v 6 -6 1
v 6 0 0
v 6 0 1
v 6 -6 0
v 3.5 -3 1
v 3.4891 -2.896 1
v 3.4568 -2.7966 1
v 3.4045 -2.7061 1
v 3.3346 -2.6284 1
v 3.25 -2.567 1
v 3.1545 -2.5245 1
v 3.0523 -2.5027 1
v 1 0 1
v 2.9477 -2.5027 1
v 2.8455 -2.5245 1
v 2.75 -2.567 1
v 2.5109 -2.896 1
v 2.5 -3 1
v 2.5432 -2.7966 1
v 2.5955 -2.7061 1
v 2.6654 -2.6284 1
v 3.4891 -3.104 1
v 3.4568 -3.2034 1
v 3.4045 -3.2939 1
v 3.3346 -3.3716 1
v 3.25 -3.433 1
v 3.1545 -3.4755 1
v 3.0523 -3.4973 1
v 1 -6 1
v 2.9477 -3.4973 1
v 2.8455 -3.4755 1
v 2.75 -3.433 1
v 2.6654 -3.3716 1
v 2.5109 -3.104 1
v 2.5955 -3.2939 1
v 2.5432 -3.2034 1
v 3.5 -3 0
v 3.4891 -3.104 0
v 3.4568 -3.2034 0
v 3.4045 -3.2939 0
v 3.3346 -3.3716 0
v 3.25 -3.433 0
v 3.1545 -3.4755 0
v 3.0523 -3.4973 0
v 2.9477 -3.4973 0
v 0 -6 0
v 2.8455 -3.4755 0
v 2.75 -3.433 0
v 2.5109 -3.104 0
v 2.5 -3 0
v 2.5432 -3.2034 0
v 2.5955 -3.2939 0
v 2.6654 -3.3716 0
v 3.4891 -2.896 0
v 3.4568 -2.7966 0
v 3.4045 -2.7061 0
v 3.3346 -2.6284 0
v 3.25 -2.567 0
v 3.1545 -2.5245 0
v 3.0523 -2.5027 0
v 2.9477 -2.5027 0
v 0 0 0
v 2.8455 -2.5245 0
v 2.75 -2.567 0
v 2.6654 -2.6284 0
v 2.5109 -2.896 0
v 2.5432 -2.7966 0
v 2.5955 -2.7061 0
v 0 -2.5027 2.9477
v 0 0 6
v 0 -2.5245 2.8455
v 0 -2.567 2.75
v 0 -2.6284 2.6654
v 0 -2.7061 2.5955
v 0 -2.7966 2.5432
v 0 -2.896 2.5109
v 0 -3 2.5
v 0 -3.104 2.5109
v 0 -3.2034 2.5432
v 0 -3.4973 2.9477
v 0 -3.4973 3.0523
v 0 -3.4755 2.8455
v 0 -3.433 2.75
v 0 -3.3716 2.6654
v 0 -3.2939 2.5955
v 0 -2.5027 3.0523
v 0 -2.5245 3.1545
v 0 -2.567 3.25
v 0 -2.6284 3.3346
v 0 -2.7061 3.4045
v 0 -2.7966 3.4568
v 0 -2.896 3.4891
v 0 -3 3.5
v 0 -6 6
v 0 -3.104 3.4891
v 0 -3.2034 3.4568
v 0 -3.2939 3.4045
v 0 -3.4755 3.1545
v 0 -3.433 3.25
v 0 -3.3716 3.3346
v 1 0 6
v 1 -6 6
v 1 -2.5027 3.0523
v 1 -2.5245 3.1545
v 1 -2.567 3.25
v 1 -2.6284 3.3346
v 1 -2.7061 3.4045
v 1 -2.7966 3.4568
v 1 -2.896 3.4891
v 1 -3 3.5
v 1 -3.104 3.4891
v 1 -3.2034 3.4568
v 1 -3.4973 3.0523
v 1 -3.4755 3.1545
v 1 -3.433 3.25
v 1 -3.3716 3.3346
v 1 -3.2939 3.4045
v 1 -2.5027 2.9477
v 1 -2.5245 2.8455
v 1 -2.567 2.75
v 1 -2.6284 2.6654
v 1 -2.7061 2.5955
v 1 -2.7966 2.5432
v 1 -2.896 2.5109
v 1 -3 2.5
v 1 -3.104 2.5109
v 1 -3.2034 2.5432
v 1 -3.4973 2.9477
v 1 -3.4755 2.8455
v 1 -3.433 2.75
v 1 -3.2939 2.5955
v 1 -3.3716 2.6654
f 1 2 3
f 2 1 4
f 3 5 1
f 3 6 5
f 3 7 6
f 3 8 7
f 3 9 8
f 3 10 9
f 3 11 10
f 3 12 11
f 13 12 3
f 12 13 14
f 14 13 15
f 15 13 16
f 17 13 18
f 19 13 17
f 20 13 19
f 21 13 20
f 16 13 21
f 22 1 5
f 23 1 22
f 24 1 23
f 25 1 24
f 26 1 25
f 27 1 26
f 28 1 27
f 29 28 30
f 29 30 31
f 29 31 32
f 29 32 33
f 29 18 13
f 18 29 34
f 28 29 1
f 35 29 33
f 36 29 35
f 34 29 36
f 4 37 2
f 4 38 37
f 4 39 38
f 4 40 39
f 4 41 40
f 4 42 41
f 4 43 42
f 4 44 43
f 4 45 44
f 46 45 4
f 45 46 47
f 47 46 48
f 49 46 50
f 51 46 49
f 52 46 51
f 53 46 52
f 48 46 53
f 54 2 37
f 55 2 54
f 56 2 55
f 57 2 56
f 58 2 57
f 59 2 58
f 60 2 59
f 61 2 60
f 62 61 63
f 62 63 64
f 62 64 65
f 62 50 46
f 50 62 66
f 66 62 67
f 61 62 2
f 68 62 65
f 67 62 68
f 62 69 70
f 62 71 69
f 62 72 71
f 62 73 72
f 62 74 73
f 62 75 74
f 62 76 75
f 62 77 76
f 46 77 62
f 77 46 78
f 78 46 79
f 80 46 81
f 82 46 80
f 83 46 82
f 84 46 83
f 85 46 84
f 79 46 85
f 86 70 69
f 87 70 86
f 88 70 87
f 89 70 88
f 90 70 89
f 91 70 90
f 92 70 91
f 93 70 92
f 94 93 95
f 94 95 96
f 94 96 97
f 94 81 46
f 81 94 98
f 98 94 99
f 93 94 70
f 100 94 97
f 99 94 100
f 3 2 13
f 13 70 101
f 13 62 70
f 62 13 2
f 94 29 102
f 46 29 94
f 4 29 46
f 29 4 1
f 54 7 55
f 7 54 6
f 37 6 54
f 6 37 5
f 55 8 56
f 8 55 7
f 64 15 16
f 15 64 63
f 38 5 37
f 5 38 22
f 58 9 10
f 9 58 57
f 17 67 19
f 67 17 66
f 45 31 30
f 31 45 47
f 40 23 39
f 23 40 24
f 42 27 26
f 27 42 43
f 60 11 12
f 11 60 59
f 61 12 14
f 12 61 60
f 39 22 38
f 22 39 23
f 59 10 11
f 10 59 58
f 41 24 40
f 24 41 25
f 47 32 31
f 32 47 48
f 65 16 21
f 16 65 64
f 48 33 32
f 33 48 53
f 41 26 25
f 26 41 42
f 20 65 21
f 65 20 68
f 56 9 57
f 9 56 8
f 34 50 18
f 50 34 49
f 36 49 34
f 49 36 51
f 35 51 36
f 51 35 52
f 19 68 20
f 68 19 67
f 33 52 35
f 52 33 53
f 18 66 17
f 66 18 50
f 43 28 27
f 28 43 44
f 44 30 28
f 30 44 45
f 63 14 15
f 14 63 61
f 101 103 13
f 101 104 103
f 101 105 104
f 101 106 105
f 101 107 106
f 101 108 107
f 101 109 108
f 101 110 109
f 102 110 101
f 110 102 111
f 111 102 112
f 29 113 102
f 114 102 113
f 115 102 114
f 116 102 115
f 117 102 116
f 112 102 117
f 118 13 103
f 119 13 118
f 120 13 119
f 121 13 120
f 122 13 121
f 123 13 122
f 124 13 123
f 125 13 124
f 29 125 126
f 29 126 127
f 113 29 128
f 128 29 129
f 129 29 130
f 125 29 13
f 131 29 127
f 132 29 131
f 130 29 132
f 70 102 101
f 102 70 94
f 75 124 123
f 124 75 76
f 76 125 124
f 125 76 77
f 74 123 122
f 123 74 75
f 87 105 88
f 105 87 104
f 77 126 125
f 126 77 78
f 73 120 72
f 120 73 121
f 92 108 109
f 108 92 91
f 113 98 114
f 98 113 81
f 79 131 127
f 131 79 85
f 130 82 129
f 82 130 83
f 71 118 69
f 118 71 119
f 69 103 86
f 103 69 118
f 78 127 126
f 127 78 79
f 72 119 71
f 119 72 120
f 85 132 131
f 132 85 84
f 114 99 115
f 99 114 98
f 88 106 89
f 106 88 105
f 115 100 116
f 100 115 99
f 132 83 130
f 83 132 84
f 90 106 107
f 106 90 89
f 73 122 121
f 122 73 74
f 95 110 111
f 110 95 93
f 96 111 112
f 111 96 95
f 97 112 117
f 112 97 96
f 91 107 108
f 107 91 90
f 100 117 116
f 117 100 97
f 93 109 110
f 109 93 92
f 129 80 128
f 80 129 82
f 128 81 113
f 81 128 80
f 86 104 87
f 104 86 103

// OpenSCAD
module plate() {
    difference(){
    
        cube([6,6,1]);
        translate([3,3,0]) {
            cylinder(r = 0.5, h = 1, $fn = 30);
        }
    }
}




module hinge() {

union(){

translate([0,-6,0]) { 
    plate();
}


rotate(a = 90, v= [0, 1, 0 ])  {
    translate([-6, -6, 0]) plate();
}
}

}


hinge();
